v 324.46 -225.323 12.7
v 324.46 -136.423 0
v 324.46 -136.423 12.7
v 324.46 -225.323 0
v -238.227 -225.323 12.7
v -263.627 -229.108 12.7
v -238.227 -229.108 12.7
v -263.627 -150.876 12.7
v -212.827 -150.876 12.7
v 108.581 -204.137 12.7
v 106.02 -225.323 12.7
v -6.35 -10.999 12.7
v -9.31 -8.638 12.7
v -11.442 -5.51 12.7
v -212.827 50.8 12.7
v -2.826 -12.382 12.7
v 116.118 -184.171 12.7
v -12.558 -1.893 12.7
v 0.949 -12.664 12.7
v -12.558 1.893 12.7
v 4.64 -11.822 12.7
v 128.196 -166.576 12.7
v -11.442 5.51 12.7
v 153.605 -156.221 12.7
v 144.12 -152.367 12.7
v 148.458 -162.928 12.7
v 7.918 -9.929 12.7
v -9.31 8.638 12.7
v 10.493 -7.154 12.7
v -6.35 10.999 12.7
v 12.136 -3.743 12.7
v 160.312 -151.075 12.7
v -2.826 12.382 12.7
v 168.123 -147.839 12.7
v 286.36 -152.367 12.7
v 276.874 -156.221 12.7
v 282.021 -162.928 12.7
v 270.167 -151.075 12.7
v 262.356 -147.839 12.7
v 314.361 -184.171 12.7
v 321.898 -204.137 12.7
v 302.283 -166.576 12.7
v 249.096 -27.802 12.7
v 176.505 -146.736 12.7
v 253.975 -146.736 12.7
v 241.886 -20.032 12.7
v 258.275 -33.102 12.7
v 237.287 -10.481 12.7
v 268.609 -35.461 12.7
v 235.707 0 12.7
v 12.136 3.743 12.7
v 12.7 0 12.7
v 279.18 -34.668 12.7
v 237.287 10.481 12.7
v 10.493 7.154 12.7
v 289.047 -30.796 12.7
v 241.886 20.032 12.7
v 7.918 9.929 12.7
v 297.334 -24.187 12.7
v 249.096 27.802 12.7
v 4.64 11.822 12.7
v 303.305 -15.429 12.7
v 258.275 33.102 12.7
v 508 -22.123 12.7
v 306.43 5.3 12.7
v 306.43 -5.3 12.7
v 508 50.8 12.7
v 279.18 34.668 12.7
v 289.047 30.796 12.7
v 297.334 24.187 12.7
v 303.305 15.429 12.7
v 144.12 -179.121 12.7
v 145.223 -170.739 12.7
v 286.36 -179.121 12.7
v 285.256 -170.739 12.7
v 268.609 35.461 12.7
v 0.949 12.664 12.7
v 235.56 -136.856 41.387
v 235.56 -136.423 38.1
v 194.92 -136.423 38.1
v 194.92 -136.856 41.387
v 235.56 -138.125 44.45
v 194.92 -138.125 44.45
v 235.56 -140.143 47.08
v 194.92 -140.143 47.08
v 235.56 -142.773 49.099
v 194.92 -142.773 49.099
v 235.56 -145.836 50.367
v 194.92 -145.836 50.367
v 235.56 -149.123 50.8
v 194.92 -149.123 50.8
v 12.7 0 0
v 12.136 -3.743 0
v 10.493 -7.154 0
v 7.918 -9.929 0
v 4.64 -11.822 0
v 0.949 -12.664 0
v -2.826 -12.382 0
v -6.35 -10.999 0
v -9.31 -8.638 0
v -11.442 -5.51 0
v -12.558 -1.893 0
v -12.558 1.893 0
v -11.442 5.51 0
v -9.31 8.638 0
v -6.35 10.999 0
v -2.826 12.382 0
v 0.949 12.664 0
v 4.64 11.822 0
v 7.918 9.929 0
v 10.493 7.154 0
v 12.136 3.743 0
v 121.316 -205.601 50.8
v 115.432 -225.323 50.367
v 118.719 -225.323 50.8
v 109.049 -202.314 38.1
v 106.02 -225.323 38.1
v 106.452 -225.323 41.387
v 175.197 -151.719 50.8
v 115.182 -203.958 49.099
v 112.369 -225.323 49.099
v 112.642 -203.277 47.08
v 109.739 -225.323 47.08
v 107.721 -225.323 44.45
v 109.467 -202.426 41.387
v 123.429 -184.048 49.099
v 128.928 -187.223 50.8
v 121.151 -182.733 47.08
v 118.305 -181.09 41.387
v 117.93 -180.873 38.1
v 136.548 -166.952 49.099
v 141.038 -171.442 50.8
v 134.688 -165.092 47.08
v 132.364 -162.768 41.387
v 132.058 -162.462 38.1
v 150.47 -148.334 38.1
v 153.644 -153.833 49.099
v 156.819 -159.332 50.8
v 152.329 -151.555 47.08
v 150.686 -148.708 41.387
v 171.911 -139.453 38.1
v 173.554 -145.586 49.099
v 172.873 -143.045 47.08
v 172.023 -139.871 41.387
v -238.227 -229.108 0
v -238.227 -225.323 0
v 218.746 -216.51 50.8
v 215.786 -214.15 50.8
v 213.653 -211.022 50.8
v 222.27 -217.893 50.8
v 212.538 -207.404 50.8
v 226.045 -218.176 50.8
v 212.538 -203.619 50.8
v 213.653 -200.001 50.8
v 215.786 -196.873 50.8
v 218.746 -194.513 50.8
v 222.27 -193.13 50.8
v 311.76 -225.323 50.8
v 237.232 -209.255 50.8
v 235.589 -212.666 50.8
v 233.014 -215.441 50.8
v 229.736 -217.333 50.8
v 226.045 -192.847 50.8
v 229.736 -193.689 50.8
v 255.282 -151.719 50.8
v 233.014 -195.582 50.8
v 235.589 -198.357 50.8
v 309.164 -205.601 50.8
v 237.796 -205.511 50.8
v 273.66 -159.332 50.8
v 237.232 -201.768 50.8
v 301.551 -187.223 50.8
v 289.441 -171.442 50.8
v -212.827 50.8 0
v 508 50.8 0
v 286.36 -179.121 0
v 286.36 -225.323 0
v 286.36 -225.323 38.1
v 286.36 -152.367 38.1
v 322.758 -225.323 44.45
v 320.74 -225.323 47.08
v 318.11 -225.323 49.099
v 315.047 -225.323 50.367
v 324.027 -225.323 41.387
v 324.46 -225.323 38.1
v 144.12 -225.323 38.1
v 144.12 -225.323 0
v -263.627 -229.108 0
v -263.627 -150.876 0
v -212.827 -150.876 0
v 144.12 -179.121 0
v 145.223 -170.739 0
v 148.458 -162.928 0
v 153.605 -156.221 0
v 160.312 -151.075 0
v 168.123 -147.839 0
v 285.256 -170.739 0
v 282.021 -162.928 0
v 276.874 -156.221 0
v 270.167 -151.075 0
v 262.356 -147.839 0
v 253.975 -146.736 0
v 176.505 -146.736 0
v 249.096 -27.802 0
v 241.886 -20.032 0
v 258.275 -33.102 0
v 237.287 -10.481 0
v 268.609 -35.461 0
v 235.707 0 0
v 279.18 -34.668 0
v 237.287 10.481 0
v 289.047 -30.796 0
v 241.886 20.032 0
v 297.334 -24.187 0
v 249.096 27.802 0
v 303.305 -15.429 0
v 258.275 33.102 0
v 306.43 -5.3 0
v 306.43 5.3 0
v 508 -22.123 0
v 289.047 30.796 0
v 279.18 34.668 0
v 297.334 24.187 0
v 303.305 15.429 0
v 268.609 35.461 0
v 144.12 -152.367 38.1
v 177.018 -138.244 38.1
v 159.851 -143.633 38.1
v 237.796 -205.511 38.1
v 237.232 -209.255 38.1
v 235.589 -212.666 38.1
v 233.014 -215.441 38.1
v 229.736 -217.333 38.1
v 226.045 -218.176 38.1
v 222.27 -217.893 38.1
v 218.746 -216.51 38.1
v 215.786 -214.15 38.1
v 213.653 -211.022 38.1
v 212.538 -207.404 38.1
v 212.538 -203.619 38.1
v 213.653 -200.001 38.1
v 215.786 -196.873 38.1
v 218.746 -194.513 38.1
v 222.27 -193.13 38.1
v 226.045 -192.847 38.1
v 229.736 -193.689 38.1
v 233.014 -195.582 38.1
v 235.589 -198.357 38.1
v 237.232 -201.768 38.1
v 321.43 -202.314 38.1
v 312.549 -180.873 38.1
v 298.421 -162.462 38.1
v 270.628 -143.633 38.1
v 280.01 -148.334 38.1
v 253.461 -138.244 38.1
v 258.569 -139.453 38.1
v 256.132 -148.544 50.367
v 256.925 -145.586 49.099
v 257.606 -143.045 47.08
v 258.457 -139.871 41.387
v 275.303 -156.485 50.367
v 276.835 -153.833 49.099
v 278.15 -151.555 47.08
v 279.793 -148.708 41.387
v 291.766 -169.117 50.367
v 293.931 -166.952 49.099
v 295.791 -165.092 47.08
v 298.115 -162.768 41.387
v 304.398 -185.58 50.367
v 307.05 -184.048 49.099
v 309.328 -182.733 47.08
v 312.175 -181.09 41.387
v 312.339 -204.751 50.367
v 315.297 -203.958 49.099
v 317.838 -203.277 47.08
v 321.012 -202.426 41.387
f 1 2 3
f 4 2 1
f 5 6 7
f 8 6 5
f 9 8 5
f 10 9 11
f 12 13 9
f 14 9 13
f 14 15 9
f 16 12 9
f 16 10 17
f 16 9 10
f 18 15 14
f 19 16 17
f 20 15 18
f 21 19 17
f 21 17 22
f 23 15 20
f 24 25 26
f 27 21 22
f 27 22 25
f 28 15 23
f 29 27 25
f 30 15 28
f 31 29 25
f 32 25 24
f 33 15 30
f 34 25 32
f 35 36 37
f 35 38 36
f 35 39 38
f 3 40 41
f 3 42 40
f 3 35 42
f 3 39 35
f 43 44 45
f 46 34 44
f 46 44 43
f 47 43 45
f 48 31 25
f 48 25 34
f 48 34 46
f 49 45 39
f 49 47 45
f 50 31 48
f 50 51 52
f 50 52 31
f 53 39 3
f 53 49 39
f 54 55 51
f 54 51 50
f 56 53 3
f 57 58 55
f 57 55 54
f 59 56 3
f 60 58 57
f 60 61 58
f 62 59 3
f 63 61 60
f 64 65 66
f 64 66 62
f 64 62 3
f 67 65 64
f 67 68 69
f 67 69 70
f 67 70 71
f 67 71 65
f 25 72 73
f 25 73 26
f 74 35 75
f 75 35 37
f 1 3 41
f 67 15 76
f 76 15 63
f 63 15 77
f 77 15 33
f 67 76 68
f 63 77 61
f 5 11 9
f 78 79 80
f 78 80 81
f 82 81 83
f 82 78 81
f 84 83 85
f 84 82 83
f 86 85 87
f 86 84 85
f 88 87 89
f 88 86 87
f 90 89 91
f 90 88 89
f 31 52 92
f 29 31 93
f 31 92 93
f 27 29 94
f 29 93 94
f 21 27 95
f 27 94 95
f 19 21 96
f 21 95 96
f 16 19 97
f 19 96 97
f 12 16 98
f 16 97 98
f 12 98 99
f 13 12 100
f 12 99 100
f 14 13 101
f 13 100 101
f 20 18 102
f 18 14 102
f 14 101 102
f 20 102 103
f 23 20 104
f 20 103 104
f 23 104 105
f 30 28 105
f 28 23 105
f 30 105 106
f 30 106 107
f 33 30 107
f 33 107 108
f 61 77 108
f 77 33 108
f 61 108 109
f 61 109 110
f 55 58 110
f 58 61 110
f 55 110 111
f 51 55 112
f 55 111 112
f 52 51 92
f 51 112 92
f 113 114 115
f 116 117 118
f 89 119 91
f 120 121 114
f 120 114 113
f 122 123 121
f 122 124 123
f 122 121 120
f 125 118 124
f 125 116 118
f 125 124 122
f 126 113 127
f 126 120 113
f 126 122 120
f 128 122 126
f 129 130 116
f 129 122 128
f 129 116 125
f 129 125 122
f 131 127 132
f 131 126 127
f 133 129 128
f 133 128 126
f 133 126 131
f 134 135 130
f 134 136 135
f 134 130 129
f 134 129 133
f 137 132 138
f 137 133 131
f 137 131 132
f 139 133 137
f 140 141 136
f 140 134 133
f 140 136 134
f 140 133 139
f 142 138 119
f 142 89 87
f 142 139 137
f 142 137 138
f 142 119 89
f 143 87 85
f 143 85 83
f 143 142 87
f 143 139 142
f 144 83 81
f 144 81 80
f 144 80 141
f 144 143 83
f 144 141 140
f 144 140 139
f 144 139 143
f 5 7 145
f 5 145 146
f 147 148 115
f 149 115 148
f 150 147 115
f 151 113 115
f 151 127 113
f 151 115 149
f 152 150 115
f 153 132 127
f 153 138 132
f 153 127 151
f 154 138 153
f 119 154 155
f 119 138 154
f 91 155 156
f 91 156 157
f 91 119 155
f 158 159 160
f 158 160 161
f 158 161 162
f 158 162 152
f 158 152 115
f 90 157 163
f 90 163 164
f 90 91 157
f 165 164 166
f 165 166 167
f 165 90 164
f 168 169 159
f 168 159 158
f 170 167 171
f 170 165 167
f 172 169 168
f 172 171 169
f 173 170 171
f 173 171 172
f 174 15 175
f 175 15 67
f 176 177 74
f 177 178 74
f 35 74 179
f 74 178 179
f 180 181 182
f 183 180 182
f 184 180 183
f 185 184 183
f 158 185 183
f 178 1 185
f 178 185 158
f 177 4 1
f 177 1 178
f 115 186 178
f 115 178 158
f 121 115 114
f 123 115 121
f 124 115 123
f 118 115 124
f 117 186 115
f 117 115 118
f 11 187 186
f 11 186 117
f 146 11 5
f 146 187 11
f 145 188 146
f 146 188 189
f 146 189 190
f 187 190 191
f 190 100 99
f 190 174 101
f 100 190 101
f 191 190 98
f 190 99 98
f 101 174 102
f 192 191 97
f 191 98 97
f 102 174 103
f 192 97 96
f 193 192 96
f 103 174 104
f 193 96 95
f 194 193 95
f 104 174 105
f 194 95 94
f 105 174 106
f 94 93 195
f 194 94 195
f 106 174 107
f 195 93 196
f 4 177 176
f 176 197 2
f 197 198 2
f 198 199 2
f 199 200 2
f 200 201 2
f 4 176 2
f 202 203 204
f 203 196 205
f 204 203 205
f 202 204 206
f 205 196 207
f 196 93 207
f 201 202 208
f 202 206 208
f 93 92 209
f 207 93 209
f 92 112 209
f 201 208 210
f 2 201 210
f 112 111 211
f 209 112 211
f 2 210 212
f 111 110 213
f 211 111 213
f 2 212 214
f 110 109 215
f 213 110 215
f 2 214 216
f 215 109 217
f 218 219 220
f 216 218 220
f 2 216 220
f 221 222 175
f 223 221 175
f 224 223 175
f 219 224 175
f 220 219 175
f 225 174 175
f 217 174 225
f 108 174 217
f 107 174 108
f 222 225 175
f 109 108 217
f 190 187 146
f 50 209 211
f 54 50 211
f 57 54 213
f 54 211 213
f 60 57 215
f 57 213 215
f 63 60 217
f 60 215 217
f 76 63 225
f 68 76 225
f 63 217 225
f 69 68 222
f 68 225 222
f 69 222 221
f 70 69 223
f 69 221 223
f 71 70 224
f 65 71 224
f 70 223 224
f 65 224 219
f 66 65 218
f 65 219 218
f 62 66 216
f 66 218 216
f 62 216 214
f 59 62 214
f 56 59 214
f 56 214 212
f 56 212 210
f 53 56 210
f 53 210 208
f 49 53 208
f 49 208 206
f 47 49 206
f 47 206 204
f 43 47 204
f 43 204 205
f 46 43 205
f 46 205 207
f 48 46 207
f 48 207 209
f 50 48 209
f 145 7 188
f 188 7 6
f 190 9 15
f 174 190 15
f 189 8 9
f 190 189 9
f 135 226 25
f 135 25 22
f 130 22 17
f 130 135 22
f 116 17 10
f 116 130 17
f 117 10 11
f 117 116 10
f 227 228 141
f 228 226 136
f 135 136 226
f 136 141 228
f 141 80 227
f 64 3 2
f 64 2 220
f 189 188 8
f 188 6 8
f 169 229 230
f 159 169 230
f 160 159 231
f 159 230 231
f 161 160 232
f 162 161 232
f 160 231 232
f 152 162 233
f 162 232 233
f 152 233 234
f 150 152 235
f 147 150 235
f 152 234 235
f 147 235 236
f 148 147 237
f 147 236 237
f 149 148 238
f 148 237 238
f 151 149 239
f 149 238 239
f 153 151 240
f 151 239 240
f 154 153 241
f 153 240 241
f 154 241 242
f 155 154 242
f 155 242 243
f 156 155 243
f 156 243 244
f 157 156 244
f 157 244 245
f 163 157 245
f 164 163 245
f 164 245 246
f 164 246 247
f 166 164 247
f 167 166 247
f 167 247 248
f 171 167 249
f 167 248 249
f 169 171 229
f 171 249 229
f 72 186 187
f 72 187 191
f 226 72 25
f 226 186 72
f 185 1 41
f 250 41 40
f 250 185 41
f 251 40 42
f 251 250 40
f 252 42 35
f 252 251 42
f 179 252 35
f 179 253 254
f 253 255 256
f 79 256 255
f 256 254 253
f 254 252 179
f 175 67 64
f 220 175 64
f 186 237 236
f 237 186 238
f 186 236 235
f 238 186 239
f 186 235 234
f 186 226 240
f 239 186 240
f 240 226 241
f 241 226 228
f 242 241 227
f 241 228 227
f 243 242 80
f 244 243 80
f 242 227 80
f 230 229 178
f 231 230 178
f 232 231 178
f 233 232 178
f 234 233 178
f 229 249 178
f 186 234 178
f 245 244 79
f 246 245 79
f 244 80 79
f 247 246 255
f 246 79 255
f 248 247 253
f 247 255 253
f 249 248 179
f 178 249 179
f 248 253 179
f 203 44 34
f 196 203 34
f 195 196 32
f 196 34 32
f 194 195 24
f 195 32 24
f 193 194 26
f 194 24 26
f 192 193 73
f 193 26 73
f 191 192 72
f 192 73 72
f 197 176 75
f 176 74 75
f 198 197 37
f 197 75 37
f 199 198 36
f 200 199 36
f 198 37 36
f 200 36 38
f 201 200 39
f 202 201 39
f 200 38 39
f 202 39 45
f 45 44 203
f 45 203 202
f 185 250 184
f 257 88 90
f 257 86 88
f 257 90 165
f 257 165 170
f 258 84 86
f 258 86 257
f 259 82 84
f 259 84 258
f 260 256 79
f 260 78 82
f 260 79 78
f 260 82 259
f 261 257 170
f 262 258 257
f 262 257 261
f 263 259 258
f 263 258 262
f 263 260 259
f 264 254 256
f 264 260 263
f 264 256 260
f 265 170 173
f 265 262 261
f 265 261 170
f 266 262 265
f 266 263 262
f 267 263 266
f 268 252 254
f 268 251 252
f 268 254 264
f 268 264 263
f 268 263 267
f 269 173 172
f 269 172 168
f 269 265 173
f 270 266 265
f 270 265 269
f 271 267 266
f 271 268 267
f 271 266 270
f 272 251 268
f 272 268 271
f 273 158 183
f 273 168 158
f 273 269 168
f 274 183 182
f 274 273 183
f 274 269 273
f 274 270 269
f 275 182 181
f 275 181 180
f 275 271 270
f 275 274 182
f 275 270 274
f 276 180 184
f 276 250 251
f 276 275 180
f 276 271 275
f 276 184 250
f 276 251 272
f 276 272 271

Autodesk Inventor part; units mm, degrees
ref_plane "YZ Plane" through (0, 0, 0) normal (1, 0, 0) x (0, 1, 0)
ref_plane "XZ Plane" through (0, 0, 0) normal (0, 1, 0) x (-1, 0, 0)
ref_plane "XY Plane" through (0, 0, 0) normal (0, 0, 1) x (1, 0, 0)
sketch "Sketch1" plane through (0, 0, 0) normal (0, 0, 1) x (1, 0, 0)
  circle A0 centre (0, 0) radius 12.7
  circle A1 centre (0, 0) radius 50.8
  line L0 (50.8, 0) -> (50.8, -225.3234)
  line L1 (50.8, -225.3234) -> (-50.8, -225.3234)
  line L2 (-50.8, -225.3234) -> (-50.8, 0)
  line L3 (-50.8, 0) -> (-12.7, 0)
  line L4 (12.7, 0) -> (50.8, 0)
  dimension "d1" = 101.6
  dimension "d0" = 25.4
  dimension "d2" = 225.3234
extrude "Extrusion1" add sketch "Sketch1" along normal blind 12.7 contours L4 A1 L3 A0 | A0 L3 A1 L4 | L0 L1 L2 A1
sketch "Sketch2" plane through (0, 0, 12.7) normal (0, 0, 1) x (1, 0, 0)
  circle A0 centre (0, 0) radius 12.7 projected
  arc A1 (50.8, 0) -> (-50.8, 0) centre (0, 0) ccw projected
  line L0 (-50.8, 0) -> (-50.8, -225.3234) projected
  line L1 (-50.8, -225.3234) -> (50.8, -225.3234) projected
  line L2 (50.8, -225.3234) -> (50.8, 0) projected
  circle A2 centre (176.5046, -179.1208) radius 32.385
  circle A3 centre (253.9746, -179.1208) radius 32.385
  line L3 (144.1196, -225.3234) -> (144.1196, -179.1208)
  line L4 (286.3596, -225.3234) -> (286.3596, -179.1208)
  line L5 (176.5046, -146.7358) -> (253.9746, -146.7358)
  line L6 (50.8, -225.3234) -> (144.1196, -225.3234)
  line L7 (286.3596, -225.3234) -> (508, -225.3234)
  line L8 (-50.8, -225.3234) -> (-238.2266, -225.3234)
  line L9 (-263.6266, -225.3234) -> (-263.6266, -150.876)
  line L10 (-263.6266, -150.876) -> (-212.8266, -150.876)
  line L11 (-212.8266, -150.876) -> (-212.8266, 50.8)
  line L12 (-212.8266, 50.8) -> (508, 50.8)
  line L13 (508, 50.8) -> (508, -225.3234)
  line L14 (-238.2266, -229.108) -> (-238.2266, -225.3234)
  line L15 (-238.2266, -229.108) -> (-263.6266, -229.108)
  line L16 (-263.6266, -229.108) -> (-263.6266, -225.3234)
  dimension "d5" = 176.5046
  dimension "d6" = 179.1208
  dimension "d7" = 64.77
  dimension "d8" = 64.77
  dimension "d9" = 77.47
  dimension "d11" = 212.8266
  dimension "d13" = 50.8
  dimension "d16" = 150.876
  dimension "d17" = 508
  dimension "d18" = 229.108
extrude "Extrusion2" add sketch "Sketch2" against normal blind 12.7 contours A1 L12 L13 L7 L4 A3 L5 A2 L3 L6 L2 | A1 L0 L8 L14 L15 L16 L9 L10 L11 L12
sketch "Sketch3" plane through (0, 0, 12.7) normal (0, 0, 1) x (1, 0, 0)
  circle A0 centre (0, 0) radius 12.7 projected
  circle A1 centre (225.0958, -205.5114) radius 12.7
  dimension "d19" = 25.4
  dimension "d20" = 304.8
  dimension "d21" = 205.5114
sketch "Sketch4" plane through (0, 0, 12.7) normal (0, 0, 1) x (1, 0, 0)
  line L0 (144.1196, -225.3234) -> (106.0196, -225.3234)
  line L1 (106.0196, -225.3234) -> (106.0196, -136.4234)
  line L2 (106.0196, -136.4234) -> (144.1196, -136.4234)
  line L3 (144.1196, -136.4234) -> (144.1196, -225.3234)
  line L4 (286.3596, -225.3234) -> (324.4596, -225.3234)
  line L5 (324.4596, -225.3234) -> (324.4596, -136.4234)
  line L6 (324.4596, -136.4234) -> (286.3596, -136.4234)
  line L7 (286.3596, -136.4234) -> (286.3596, -225.3234)
  dimension "d22" = 38.1
  dimension "d23" = 88.9
  dimension "d24" = 38.1
  dimension "d25" = 88.9
extrude "Extrusion3" add sketch "Sketch4" along normal blind 25.4
sketch "Sketch5" plane through (0, 0, 38.1) normal (0, 0, 1) x (1, 0, 0)
  line L0 (106.0196, -136.4234) -> (324.4596, -136.4234)
  line L1 (324.4596, -136.4234) -> (324.4596, -225.3234)
  line L2 (324.4596, -225.3234) -> (106.0196, -225.3234)
  line L3 (106.0196, -225.3234) -> (106.0196, -136.4234)
  point P0 (0, 0)
  dimension "d28" = 218.44
extrude "Extrusion4" add sketch "Sketch5" along normal blind 12.7
extrude "Extrusion5" cut sketch "Sketch3" along normal blind 76.2 contours A1
sketch "Sketch6" plane through (0, 0, 12.7) normal (0, 0, 1) x (1, 0, 0)
  line L0 (324.4596, -136.4234) -> (324.4596, -225.3234) projected
  line L1 (324.4596, -225.3234) -> (508, -225.3234) projected
  line L2 (508, -225.3234) -> (508, 50.8) projected
  line L3 (324.4596, -136.4234) -> (508, -22.1234)
  dimension "d33" = 203.2
extrude "Extrusion6" cut sketch "Sketch6" against normal blind 25.4
sketch "Sketch7" plane through (0, 0, 50.8) normal (0, 0, 1) x (1, 0, 0)
  line L0 (106.0196, -136.4234) -> (106.0196, -225.3234) projected
  line L1 (324.4596, -225.3234) -> (324.4596, -136.4234) projected
  line L2 (324.4596, -136.4234) -> (106.0196, -136.4234) projected
  arc A0 (324.4596, -225.3234) -> (235.5596, -136.4234) centre (235.5596, -225.3234) ccw
  line L3 (324.4596, -225.3234) -> (235.5596, -136.4234) construction
  line L4 (324.4596, -225.3234) -> (450.1832, -225.3234) construction
  arc A1 (194.9196, -136.4234) -> (106.0196, -225.3234) centre (194.9196, -225.3234) ccw
  line L5 (106.0196, -225.3234) -> (194.9196, -136.4234) construction
  line L6 (106.0196, -225.3234) -> (231.7432, -225.3234) construction
  point P0 (0, 0)
  dimension "d36" = 135
  dimension "d37" = 45
extrude "Extrusion7" cut sketch "Sketch7" against normal blind 38.1
fillet "Fillet1" radius 12.7 3 edges at (215.2396, -136.4234, 50.8) (298.4214, -162.4616, 50.8) (132.0578, -162.4616, 50.8)
sketch "Sketch8" plane through (0, 0, 0) normal (0, 0, -1) x (-1, 0, 0)
  line L0 (-508, 50.8) -> (-508, -22.1234) projected
  circle A0 centre (0, 0) radius 12.7 projected
  line L1 (0, 0) -> (-271.2669, 0)
  circle A1 centre (-271.2669, 0) radius 35.56
  dimension "d41" = 71.12
extrude "Extrusion8" cut sketch "Sketch8" against normal blind 25.4 contours A1
sketch "Sketch9" plane through (0, 0, 0) normal (0, 0, -1) x (-1, 0, 0)
  circle A0 centre (-271.2669, 0) radius 35.56 projected
  line L0 (-324.4596, -136.4234) -> (-324.4596, -225.3234) projected
  line L1 (-324.4596, -225.3234) -> (-286.3596, -225.3234) projected
  line L2 (-286.3596, -225.3234) -> (-286.3596, -179.1208) projected
  arc A1 (-253.9746, -146.7358) -> (-286.3596, -179.1208) centre (-253.9746, -179.1208) ccw projected
  line L3 (-253.9746, -146.7358) -> (-176.5046, -146.7358) projected
  arc A2 (-144.1196, -179.1208) -> (-176.5046, -146.7358) centre (-176.5046, -179.1208) ccw projected
  line L4 (-144.1196, -179.1208) -> (-144.1196, -225.3234) projected
  line L5 (-144.1196, -225.3234) -> (238.2266, -225.3234) projected
  line L6 (238.2266, -225.3234) -> (238.2266, -229.108) projected
  line L7 (238.2266, -229.108) -> (263.6266, -229.108) projected
  line L8 (263.6266, -229.108) -> (263.6266, -150.876) projected
  line L9 (263.6266, -150.876) -> (212.8266, -150.876) projected
  line L10 (212.8266, -150.876) -> (212.8266, 50.8) projected
  line L11 (212.8266, 50.8) -> (-508, 50.8) projected
  line L12 (-508, 50.8) -> (-508, -22.1234) projected
  line L13 (-508, -22.1234) -> (-324.4596, -136.4234) projected
  circle A3 centre (0, 0) radius 12.7 projected
properties part number "Shooter_TopMotorSupport"
